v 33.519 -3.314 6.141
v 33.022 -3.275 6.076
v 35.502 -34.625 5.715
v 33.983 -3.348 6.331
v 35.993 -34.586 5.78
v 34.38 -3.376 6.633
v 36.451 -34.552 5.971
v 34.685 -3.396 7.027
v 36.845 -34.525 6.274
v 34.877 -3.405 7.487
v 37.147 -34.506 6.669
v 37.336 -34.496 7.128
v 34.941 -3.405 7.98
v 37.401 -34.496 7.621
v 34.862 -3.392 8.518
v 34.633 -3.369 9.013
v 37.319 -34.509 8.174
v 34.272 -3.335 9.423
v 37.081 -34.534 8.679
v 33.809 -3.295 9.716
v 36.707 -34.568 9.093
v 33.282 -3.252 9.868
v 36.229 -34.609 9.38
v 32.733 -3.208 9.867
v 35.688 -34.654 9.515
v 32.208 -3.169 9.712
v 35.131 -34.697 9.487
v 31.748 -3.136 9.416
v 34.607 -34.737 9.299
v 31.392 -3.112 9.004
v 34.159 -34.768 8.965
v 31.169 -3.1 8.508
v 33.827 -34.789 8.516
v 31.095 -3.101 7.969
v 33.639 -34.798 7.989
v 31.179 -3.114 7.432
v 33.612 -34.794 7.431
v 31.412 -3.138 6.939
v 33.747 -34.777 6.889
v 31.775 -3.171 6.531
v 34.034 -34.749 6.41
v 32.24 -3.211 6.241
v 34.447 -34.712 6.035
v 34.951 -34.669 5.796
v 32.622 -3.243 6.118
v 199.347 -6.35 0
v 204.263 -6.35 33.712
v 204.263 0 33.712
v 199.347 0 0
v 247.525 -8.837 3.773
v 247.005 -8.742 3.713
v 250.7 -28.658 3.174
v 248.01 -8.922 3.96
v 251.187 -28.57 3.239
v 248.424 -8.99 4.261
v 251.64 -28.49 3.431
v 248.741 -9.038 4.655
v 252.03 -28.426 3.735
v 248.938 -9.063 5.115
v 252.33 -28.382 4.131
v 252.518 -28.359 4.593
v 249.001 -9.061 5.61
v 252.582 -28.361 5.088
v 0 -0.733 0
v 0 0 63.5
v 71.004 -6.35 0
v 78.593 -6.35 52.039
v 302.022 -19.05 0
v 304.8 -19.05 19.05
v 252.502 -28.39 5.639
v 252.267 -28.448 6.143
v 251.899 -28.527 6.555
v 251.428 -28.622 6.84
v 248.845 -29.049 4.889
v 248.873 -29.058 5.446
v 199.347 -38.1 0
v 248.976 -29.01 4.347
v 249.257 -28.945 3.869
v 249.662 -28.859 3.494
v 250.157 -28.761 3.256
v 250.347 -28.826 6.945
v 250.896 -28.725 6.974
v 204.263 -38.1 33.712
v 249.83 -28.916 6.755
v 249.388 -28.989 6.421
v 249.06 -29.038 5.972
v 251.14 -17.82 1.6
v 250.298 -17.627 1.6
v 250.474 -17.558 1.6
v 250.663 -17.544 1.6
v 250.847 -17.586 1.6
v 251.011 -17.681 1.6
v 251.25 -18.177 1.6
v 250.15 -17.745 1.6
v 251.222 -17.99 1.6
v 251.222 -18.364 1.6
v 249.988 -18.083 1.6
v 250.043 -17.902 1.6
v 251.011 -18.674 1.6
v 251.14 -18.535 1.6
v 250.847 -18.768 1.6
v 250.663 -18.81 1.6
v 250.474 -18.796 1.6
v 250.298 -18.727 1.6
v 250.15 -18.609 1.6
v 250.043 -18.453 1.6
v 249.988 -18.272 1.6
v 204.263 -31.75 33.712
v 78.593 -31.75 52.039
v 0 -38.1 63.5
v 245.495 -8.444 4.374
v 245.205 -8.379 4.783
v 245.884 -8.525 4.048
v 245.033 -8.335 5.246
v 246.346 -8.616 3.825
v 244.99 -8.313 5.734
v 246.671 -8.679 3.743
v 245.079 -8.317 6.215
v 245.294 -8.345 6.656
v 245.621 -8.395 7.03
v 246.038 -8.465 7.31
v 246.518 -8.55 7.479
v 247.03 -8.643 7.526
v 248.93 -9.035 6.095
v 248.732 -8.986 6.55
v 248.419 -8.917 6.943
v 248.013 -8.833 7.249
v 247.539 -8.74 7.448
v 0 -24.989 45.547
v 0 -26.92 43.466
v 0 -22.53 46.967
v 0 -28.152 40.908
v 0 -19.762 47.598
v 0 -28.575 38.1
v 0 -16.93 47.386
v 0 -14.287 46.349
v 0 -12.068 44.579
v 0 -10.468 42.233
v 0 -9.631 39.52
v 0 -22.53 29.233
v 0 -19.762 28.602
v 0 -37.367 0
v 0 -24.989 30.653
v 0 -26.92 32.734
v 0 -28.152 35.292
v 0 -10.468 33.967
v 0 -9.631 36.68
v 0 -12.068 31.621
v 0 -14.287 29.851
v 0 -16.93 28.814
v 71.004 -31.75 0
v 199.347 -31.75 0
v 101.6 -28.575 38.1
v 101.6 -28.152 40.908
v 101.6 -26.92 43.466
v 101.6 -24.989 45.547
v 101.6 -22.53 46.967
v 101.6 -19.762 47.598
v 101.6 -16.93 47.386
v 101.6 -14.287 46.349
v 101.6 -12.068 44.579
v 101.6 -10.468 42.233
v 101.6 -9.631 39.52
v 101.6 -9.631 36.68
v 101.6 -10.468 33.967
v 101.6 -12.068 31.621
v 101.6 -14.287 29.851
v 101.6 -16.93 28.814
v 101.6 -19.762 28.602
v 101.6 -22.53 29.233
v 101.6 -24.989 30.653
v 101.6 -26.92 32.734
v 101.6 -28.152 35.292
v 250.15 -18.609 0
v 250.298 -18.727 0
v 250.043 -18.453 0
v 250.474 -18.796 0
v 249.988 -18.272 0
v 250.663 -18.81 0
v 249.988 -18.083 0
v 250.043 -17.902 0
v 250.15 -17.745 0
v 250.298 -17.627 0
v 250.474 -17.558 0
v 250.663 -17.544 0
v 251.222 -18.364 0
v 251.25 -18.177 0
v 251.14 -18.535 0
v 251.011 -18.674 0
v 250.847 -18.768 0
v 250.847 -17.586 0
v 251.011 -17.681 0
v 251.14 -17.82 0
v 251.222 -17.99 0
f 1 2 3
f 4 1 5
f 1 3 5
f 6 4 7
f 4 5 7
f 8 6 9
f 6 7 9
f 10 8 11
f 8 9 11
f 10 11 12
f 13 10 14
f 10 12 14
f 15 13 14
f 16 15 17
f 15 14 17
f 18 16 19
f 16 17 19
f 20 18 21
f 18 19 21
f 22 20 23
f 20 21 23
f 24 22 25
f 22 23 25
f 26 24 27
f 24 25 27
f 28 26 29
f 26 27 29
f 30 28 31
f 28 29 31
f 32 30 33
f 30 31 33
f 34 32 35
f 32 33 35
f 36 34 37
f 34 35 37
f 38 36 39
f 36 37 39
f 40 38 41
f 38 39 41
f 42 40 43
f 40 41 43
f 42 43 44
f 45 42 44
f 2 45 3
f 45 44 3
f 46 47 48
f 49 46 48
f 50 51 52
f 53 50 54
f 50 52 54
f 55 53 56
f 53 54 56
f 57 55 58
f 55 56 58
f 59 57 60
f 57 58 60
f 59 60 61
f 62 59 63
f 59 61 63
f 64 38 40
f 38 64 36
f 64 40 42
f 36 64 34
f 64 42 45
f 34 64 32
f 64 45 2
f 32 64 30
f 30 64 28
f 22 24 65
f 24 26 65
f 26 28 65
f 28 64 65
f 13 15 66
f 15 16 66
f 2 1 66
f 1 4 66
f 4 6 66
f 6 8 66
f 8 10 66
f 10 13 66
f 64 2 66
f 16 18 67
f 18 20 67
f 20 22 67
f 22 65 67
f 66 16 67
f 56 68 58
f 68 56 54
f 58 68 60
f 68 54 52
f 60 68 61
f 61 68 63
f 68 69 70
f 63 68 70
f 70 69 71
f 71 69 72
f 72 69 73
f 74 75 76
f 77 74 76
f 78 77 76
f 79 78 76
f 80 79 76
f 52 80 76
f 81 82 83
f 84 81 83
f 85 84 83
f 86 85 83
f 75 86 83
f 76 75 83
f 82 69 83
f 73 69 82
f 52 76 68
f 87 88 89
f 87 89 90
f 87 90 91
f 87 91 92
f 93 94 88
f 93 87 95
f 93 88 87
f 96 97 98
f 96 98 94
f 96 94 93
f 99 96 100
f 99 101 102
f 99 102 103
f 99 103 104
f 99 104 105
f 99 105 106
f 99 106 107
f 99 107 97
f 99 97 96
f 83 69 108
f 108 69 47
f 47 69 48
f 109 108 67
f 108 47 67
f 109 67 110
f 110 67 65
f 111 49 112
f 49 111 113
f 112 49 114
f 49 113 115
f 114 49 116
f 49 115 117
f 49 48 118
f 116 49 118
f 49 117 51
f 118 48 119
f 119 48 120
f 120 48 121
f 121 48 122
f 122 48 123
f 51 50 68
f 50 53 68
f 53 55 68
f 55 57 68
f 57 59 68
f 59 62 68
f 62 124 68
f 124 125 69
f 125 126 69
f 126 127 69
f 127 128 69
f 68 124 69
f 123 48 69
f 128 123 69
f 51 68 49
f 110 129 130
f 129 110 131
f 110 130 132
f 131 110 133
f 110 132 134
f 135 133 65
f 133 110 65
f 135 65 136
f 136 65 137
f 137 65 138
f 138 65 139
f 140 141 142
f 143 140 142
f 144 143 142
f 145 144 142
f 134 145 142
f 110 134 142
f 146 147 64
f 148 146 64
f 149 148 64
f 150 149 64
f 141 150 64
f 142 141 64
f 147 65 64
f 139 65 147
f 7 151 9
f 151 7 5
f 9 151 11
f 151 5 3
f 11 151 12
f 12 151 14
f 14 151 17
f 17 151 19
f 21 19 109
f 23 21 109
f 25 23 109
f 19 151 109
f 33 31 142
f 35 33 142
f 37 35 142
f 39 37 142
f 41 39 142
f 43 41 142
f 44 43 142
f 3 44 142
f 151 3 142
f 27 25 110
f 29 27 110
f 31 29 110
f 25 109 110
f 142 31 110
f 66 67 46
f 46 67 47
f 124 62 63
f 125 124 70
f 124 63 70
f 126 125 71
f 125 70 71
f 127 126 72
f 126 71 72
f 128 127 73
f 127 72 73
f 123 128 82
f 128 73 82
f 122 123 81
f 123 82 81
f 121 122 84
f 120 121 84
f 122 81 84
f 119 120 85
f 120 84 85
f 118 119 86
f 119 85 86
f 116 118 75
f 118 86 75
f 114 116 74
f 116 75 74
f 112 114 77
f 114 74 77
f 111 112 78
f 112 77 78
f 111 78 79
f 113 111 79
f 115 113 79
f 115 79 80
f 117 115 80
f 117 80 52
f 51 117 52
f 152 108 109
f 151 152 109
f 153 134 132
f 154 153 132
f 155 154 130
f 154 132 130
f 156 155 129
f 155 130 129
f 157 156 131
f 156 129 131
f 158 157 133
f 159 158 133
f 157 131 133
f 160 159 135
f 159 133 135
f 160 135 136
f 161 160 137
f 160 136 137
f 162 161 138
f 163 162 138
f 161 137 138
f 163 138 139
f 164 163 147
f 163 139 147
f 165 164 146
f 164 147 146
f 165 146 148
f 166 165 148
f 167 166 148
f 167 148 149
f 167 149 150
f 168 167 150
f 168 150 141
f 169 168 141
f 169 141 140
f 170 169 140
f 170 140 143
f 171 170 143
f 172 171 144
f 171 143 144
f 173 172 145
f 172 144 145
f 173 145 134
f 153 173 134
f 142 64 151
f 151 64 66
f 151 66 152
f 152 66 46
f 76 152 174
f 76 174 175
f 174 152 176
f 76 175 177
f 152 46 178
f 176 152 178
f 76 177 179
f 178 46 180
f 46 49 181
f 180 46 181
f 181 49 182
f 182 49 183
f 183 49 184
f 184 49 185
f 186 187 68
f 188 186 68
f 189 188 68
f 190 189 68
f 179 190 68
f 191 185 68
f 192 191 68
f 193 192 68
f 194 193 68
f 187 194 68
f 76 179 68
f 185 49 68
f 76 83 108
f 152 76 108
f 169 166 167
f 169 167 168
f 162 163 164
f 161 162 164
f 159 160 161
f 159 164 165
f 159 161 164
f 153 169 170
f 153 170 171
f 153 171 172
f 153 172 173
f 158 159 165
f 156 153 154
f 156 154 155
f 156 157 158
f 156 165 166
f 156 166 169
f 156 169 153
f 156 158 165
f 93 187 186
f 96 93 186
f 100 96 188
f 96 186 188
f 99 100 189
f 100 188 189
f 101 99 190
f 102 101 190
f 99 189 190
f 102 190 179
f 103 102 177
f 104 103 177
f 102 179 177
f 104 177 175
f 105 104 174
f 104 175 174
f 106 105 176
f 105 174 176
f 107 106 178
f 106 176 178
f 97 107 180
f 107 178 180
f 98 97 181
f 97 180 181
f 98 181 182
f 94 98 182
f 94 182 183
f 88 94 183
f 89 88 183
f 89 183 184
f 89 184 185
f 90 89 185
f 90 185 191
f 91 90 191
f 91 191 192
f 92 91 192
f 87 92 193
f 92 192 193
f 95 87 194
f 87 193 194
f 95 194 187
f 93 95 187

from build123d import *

# Parameters (mm, degrees)
F1_DEPTH   = 38.1
F2_R       = 9.525
F3_DEPTH   = 101.6
F1_FACE2_W = 38.1
F1_FACE2_H = 19.05
F5_DEPTH   = 152.4
F7_DEPTH   = 63.5
F9_DEPTH   = 50.8
F10_R      = 0.635
F11_DEPTH  = 1.6002


with BuildPart() as f1:
    # F0 (on Front) → F1 (new body)
    with BuildSketch(Plane.XZ):
        Polygon((0, 63.5), (0, 0), (304.8, 0), (304.8, 19.05), align=None)
    extrude(amount=F1_DEPTH)

    # F2 (on face) → F3 (cut)
    with BuildSketch(Plane(origin=(0, 0, 0), x_dir=(0, -1, 0), z_dir=(-1, 0, 0))):
        with Locations((19.05, 38.1)):
            Circle(F2_R)
    extrude(amount=-F3_DEPTH, mode=Mode.SUBTRACT)

    # F4 (on face) + F1_face2 (on face) → F5 (cut)
    with BuildSketch(Plane(origin=(9.0675733107, 0, 62.1776455589), x_dir=(0.9895329811, 0, -0.1443068931), z_dir=(0.1443068931, 0, 0.9895329811))):
        Polygon((197.2606063151, -6.35), (197.2606063151, 0), (-9.1634877101, 0), (70.2606063151, -6.35), (95.6606063151, -6.35), align=None)
        Polygon((-9.1634877101, -38.1), (197.2606063151, -38.1), (197.2606063151, -31.75), (95.6606063151, -31.75), (70.2606063151, -31.75), align=None)
        Polygon((298.8606063151, -19.05), (298.8606063151, 0), (197.2606063151, 0), align=None)
        Polygon((298.8606063151, -38.1), (298.8606063151, -19.05), (197.2606063151, -38.1), align=None)
    with BuildSketch(Plane(origin=(304.8, -19.05, 9.525), x_dir=(0, 1, 0), z_dir=(1, 0, 0))):
        Rectangle(F1_FACE2_W, F1_FACE2_H)
    extrude(amount=-F5_DEPTH, dir=(0.1443068931, 0, 0.9895329811), mode=Mode.SUBTRACT)

    # F6 (on face) → F7 (cut)
    with BuildSketch(Plane(origin=(2.9374947207, -37.1300355722, -0.4283846468), x_dir=(0.9968855377, 0.0788568126, 0.0009098038), z_dir=(0.0788620609, -0.9968191957, -0.0115007172))):
        with BuildLine():
            ThreePointArc((34.5711449956, 8.0186913962), (31.3191065774, 9.3657298144), (32.6661449956, 6.1136913962))
            ThreePointArc((32.6661449956, 6.1136913962), (34.0131834138, 6.6716529781), (34.5711449956, 8.0186913962))
        make_face()
    extrude(amount=-F7_DEPTH, mode=Mode.SUBTRACT)

    # F8 (on face) → F9 (cut)
    with BuildSketch(Plane(origin=(13.4581916909, -72.5362607665, -1.9626529549), x_dir=(0.9832319067, 0.1822928664, 0.004932397), z_dir=(0.1823595835, -0.9828721869, -0.0265941059))):
        with BuildLine():
            ThreePointArc((241.2876717144, 3.947847759), (242.6407823243, 4.5024670011), (243.2020712552, 5.8528245695))
            ThreePointArc((243.2020712552, 5.8528245695), (239.953360186, 7.2031821379), (241.2876717144, 3.947847759))
        make_face()
    extrude(amount=-F9_DEPTH, mode=Mode.SUBTRACT)

    # F10 (on face) → F11 (cut)
    with BuildSketch(Plane(origin=(0, 0, 0), x_dir=(1, 0, 0), z_dir=(0, 0, -1))):
        with Locations((250.615478633, 18.1772389299)):
            Circle(F10_R)
    extrude(amount=-F11_DEPTH, mode=Mode.SUBTRACT)


solid = f1.part
